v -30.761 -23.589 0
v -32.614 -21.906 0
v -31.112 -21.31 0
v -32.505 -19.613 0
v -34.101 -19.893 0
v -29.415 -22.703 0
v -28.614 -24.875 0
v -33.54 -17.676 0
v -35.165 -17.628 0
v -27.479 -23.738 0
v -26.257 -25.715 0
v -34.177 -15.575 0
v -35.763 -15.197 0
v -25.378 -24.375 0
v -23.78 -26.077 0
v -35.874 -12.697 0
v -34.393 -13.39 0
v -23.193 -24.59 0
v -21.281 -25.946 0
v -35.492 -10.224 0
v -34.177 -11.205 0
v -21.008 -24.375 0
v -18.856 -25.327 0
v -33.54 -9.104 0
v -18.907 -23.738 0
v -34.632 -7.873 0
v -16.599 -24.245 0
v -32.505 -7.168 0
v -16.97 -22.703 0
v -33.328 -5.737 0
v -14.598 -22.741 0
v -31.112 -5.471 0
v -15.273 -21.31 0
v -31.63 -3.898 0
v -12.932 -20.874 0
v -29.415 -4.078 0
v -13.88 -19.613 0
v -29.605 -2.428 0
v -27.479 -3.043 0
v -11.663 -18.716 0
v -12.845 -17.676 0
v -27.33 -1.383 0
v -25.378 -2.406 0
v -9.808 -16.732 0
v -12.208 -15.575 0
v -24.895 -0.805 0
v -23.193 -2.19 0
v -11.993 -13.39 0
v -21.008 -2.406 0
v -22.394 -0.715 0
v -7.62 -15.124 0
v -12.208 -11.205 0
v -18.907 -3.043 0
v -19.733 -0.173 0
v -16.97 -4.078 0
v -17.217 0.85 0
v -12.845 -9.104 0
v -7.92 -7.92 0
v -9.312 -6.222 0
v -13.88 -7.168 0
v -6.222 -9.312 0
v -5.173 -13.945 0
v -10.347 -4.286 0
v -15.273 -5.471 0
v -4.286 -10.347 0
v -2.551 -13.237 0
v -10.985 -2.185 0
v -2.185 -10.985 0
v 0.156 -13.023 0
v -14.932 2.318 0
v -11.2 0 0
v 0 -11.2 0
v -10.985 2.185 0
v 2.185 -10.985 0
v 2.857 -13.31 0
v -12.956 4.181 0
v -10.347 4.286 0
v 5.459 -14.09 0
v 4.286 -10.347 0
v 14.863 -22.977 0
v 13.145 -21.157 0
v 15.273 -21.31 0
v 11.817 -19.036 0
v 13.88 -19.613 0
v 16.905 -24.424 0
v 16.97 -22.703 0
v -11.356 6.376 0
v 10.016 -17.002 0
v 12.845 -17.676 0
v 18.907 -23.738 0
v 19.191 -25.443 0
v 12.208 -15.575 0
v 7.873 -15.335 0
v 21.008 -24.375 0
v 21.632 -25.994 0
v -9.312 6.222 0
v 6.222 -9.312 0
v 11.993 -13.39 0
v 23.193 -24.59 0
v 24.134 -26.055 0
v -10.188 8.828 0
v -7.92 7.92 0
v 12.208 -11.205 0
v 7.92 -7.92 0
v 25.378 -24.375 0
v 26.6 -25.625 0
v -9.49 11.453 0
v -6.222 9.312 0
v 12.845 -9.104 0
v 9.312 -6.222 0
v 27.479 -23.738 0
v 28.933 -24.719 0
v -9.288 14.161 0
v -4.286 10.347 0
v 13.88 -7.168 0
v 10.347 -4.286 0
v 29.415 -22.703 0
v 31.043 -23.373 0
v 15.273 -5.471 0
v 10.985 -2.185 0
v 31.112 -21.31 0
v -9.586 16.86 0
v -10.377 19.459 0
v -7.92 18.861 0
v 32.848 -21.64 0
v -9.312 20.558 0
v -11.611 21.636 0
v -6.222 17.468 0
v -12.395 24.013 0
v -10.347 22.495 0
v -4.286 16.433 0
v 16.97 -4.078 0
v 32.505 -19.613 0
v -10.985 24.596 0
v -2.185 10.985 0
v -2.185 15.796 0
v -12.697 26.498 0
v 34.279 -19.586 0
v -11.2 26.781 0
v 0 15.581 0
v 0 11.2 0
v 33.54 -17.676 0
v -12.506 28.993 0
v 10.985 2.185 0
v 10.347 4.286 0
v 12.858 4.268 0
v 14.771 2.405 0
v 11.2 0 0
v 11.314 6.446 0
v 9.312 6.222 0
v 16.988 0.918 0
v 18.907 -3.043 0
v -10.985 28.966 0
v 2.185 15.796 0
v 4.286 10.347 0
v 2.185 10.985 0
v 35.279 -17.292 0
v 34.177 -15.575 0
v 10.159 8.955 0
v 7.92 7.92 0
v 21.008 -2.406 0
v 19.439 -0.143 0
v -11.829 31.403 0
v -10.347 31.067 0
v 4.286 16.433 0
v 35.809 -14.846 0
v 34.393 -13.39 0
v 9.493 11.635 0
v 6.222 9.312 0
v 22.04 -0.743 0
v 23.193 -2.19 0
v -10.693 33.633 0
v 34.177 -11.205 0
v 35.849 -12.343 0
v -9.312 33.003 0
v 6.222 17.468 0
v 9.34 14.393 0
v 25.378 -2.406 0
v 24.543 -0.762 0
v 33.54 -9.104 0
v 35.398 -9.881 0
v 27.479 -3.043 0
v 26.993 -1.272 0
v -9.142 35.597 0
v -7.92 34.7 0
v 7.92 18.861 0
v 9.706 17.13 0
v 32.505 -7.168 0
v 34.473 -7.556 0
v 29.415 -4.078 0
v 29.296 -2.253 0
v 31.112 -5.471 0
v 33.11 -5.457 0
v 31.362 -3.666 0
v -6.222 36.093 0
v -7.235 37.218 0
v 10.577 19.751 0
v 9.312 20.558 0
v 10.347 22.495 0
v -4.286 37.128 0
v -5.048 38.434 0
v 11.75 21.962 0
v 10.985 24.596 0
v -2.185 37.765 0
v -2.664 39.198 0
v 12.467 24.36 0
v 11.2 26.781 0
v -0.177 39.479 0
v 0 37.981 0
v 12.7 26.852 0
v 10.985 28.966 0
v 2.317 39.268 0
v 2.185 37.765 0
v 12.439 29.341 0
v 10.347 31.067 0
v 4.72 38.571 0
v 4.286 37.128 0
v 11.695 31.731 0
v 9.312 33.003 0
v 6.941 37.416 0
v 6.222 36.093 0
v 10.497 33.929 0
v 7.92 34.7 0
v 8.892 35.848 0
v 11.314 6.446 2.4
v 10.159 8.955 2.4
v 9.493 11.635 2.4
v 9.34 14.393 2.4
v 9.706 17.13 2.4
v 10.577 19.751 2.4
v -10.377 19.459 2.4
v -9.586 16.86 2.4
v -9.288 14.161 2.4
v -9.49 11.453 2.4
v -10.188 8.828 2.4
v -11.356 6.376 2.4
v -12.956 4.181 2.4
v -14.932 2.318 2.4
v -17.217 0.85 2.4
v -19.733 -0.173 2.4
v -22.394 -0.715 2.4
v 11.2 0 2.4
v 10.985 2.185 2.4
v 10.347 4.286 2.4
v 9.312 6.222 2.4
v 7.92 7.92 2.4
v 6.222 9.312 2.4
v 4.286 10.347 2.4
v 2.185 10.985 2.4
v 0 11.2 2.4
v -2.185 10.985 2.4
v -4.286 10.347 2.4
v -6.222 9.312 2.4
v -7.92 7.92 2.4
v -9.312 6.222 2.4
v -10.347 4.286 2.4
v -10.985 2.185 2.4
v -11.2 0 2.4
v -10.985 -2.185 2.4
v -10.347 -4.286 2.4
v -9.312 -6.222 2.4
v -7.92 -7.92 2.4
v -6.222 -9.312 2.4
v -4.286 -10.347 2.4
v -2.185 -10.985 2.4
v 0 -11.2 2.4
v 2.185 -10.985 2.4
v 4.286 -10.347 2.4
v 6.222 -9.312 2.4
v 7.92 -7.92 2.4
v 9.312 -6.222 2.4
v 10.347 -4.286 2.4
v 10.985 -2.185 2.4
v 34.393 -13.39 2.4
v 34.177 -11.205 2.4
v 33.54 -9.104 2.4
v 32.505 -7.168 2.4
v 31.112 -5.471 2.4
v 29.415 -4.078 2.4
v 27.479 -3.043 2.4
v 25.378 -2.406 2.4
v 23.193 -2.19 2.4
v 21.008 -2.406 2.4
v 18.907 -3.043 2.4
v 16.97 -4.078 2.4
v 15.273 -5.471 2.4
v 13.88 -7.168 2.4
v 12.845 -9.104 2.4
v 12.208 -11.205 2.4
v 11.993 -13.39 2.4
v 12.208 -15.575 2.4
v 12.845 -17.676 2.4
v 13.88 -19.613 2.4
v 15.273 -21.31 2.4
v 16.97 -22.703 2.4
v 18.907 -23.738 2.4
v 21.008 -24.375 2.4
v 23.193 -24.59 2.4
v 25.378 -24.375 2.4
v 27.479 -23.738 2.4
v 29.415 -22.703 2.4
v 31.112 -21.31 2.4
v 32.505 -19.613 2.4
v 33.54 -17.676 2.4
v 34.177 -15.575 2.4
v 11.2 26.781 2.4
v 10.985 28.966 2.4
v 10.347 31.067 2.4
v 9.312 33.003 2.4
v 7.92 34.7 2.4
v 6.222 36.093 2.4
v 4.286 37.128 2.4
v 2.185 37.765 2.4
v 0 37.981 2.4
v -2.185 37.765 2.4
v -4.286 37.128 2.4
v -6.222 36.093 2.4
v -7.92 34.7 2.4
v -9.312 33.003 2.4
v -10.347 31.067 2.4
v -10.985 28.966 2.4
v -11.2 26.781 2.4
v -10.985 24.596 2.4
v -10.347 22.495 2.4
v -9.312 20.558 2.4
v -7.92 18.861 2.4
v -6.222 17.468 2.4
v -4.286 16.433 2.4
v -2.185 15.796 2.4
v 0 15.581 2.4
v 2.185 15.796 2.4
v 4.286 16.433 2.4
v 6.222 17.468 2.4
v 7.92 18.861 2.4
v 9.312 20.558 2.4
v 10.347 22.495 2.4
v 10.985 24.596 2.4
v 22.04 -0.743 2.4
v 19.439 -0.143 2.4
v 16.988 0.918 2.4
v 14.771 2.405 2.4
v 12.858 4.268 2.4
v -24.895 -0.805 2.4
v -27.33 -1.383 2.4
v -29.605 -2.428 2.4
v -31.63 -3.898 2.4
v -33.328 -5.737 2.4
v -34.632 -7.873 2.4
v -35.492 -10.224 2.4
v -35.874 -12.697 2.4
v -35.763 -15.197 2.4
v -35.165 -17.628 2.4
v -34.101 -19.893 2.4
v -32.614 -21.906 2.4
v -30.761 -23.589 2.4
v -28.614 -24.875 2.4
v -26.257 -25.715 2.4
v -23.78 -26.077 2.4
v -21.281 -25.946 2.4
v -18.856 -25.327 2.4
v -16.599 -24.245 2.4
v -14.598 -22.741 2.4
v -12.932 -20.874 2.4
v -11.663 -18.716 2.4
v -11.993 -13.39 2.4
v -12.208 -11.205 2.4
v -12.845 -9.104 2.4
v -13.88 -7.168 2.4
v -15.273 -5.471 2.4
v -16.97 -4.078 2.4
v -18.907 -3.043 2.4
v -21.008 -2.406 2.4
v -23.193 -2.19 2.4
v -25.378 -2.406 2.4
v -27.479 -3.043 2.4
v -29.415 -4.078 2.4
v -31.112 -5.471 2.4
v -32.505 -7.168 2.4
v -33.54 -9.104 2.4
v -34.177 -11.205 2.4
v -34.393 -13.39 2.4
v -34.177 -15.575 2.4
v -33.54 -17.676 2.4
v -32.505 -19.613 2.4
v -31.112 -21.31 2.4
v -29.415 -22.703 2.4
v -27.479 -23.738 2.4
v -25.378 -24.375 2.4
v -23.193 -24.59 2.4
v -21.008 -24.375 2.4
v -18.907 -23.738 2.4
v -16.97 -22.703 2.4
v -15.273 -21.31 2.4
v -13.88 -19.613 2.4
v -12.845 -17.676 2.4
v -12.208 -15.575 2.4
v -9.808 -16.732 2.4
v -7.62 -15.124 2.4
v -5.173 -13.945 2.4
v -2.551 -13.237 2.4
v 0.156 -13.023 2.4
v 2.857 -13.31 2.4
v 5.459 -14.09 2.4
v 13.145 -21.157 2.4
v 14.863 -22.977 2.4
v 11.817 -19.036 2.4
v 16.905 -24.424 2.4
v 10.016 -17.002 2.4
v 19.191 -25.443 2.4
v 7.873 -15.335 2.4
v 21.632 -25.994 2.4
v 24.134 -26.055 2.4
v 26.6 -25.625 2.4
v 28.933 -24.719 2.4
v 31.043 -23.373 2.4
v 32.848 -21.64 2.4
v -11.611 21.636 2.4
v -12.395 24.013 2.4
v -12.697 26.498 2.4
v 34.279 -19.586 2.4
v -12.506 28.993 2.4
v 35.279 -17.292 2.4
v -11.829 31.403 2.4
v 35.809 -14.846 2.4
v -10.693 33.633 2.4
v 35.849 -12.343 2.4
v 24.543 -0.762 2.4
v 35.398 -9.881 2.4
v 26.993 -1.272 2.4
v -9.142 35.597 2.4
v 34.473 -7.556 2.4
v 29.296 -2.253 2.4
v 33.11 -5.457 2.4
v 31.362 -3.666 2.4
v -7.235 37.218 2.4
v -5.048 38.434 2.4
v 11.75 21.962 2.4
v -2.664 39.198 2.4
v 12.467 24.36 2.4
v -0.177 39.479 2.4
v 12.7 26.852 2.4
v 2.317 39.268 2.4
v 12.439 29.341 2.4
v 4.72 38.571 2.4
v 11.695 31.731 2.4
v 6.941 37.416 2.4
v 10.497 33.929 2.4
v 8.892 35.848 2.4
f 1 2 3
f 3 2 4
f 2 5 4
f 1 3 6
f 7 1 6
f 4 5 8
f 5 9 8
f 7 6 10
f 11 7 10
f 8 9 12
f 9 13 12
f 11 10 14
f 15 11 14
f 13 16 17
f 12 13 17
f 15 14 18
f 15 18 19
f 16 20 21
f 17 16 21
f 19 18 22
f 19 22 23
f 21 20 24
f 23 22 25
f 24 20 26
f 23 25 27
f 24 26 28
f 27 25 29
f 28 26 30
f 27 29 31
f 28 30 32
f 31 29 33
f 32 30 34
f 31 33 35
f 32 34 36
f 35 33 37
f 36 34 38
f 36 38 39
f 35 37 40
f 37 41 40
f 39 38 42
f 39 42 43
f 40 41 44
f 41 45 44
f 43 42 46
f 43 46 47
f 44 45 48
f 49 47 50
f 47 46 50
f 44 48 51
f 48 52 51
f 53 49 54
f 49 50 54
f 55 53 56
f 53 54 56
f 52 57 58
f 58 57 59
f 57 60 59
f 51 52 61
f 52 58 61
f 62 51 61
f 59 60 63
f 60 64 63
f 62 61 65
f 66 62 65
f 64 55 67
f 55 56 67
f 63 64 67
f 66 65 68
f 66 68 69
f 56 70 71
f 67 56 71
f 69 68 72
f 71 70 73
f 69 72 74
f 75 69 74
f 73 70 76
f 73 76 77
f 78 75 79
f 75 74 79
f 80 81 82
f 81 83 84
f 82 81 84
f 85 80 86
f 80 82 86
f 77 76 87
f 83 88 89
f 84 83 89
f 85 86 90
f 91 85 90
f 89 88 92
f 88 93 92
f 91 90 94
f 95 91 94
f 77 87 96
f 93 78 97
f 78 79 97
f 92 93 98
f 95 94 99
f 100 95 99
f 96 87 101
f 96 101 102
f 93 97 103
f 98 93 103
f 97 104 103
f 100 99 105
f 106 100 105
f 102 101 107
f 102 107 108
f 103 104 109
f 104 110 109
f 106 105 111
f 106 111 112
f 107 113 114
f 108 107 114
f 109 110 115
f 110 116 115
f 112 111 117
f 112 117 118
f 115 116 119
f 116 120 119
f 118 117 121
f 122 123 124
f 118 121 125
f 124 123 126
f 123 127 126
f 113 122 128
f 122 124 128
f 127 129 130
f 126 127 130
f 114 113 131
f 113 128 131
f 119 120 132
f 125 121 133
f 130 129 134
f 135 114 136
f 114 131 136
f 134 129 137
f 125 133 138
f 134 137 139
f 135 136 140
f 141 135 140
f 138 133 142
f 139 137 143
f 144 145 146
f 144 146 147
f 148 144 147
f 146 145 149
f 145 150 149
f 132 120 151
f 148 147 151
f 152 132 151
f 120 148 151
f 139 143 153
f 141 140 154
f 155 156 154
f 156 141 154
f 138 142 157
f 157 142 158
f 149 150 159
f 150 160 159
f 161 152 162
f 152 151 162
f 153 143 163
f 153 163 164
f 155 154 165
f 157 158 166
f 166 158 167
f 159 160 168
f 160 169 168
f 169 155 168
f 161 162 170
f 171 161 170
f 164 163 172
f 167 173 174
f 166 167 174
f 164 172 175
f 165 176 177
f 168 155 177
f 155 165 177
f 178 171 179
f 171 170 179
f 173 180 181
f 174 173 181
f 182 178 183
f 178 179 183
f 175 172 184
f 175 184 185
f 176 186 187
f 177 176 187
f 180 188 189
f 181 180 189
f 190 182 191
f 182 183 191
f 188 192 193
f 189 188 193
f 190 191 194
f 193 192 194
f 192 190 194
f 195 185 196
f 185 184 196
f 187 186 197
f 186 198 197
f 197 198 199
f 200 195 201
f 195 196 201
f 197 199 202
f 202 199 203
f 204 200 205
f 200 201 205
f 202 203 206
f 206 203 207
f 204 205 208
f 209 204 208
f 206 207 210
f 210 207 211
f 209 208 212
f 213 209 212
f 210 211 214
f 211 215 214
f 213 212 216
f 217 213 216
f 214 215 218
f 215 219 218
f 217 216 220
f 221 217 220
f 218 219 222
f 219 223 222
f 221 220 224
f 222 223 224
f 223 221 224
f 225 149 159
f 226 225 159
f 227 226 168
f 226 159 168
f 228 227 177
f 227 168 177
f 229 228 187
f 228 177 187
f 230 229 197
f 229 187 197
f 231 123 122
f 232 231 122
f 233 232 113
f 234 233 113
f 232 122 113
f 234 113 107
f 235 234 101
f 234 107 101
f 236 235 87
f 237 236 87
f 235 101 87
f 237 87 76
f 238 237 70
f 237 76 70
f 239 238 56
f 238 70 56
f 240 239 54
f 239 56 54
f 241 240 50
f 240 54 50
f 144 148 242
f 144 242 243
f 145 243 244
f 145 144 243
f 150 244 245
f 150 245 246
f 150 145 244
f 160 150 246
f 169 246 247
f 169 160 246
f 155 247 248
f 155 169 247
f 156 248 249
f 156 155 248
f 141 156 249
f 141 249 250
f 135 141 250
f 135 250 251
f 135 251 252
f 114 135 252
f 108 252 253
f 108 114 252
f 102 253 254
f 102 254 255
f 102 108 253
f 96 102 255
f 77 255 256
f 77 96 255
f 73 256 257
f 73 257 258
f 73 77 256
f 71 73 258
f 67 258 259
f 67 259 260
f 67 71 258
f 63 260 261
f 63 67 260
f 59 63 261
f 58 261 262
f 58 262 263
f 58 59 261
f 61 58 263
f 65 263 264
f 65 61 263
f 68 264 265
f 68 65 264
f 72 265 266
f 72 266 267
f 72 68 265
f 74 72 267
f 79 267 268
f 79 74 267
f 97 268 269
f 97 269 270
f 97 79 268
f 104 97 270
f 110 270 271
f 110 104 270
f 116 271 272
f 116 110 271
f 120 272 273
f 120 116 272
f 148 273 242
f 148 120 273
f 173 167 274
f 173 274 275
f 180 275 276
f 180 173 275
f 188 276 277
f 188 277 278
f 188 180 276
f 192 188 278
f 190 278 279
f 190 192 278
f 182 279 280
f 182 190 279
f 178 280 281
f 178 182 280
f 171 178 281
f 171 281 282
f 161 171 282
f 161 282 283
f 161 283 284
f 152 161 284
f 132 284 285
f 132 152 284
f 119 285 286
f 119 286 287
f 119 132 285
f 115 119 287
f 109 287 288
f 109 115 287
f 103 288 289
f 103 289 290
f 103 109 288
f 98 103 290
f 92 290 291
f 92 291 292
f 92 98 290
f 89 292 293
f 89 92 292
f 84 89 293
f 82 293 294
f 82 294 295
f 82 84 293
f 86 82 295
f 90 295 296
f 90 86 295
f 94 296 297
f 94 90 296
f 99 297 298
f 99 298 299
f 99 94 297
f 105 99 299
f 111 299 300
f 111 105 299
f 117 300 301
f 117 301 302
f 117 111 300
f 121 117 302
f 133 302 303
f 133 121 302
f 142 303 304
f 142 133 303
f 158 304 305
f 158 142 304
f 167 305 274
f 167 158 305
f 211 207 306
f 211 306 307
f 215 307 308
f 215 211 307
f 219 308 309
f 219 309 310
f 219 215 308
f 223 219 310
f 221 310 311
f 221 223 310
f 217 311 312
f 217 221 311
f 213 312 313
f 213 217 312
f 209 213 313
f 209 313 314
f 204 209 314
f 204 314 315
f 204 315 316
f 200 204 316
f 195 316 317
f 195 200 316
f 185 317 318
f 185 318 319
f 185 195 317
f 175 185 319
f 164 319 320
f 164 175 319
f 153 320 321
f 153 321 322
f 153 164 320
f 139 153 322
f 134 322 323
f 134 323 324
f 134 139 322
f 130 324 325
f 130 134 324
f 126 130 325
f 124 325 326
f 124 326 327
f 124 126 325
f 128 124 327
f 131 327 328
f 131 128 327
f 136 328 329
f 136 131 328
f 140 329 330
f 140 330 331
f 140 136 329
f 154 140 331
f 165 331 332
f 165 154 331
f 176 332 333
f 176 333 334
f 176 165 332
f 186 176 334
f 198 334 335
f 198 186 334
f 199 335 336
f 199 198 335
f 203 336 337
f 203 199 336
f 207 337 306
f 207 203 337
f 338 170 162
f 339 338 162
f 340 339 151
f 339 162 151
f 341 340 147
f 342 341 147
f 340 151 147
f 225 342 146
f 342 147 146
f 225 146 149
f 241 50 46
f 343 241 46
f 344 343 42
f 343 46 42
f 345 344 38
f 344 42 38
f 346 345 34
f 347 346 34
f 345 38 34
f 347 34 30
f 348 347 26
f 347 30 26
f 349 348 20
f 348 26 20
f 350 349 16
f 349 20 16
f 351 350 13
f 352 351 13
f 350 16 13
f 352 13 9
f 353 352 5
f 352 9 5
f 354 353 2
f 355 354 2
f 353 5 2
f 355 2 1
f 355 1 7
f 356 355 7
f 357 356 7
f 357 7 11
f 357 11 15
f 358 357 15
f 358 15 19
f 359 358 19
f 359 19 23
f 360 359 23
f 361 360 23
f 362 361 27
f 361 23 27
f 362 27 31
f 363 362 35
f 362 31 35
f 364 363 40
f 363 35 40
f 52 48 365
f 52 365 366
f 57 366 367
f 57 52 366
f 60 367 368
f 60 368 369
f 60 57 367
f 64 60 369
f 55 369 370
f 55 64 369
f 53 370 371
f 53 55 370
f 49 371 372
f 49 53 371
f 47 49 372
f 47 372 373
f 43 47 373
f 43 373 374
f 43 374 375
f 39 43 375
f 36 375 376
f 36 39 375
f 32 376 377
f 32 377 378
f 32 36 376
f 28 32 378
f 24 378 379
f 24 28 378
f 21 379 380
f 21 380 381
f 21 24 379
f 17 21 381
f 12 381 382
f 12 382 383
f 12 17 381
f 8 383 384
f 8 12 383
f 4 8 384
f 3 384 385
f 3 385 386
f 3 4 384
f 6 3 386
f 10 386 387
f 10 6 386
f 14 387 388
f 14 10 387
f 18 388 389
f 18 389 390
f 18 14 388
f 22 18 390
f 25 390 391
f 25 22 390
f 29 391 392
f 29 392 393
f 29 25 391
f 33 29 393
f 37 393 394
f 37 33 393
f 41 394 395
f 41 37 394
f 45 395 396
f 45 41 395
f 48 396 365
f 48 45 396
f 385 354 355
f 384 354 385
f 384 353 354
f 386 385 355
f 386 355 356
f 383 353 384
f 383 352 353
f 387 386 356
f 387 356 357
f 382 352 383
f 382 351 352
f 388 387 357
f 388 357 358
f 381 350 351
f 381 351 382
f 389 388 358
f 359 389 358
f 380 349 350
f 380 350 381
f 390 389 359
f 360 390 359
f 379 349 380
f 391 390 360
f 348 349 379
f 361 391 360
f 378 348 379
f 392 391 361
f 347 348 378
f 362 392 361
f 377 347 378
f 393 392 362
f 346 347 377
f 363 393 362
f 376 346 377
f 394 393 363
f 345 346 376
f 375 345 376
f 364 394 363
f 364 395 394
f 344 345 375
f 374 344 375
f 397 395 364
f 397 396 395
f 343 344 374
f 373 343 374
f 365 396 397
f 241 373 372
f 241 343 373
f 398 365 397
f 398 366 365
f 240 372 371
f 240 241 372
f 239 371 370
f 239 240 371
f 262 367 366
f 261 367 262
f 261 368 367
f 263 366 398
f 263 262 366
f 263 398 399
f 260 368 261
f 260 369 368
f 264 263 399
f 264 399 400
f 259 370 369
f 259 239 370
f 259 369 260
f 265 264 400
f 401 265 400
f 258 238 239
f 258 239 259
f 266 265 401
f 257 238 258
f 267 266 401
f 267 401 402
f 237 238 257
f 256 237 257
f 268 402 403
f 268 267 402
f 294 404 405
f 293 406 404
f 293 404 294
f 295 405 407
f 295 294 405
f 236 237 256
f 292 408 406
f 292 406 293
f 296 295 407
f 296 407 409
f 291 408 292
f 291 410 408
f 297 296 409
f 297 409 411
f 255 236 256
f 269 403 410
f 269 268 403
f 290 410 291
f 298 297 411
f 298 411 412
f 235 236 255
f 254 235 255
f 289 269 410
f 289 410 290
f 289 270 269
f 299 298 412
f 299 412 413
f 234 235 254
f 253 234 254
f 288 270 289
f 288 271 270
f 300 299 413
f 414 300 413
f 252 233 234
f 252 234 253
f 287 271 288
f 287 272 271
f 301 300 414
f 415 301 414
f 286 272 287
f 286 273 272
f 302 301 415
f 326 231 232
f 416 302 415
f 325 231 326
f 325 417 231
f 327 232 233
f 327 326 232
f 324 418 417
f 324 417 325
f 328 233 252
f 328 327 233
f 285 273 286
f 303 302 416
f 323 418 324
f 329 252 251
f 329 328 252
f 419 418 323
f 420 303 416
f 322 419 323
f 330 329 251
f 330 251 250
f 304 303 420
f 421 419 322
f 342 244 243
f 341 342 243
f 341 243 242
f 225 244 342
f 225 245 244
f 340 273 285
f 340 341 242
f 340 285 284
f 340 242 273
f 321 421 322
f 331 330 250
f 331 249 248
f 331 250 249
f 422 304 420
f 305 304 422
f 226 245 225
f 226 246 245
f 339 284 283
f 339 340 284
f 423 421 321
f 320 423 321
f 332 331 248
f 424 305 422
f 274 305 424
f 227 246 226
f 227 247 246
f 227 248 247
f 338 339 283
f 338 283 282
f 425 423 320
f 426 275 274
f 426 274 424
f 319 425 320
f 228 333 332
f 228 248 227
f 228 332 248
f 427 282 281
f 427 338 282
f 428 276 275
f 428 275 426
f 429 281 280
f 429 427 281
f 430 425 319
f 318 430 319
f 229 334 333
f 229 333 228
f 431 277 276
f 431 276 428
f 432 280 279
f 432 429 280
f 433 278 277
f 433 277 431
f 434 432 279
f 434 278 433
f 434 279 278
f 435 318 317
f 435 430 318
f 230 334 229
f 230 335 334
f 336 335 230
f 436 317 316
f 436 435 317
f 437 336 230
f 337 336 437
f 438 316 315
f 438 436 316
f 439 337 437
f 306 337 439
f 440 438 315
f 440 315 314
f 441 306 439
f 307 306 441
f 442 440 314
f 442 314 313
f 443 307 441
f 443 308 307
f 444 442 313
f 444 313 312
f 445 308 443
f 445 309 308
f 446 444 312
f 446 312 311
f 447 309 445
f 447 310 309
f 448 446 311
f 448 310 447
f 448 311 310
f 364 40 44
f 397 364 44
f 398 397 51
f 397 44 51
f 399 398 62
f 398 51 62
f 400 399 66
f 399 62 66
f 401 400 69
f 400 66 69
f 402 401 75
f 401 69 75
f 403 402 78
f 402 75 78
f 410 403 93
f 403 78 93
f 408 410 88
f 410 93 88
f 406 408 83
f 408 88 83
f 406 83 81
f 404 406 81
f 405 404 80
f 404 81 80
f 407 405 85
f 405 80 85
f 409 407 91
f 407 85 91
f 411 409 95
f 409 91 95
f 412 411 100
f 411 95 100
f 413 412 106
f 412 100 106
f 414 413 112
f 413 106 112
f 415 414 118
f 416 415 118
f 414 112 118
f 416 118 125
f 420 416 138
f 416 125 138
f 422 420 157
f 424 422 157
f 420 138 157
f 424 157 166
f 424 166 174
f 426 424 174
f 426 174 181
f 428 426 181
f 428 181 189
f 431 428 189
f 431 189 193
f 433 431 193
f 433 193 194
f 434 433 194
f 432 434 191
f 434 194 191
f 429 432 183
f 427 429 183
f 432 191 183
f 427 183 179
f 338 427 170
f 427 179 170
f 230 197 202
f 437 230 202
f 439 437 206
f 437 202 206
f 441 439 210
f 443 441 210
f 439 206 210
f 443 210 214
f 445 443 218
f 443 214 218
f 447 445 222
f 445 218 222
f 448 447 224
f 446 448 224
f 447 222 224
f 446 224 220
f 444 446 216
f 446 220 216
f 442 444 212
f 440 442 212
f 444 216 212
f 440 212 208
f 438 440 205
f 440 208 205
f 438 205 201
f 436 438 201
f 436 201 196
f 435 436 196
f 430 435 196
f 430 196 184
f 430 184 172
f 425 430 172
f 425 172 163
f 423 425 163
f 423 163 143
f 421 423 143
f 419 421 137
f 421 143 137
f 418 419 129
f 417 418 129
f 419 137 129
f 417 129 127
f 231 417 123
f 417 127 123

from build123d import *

# Parameters (mm, degrees)
F0_R     = 11.2
F1_DEPTH = 2.4


with BuildPart() as f1:
    # F0 (on Top) → F1 (new body)
    with BuildSketch(Plane.XY):
        with BuildLine():
            ThreePointArc((11.314053, 6.446049), (9.351579, 13.010427), (10.577312, 19.751342))
            ThreePointArc((10.577312, 19.751342), (-0.177298, 39.479362), (-10.376945, 19.458782))
            ThreePointArc((-10.376945, 19.458782), (-11.356072, 6.375934), (-22.39382, -0.71545))
            ThreePointArc((-22.39382, -0.71545), (-34.101481, -19.893226), (-11.663327, -18.716089))
            ThreePointArc((-11.663327, -18.716089), (0.156315, -13.022614), (11.816508, -19.035892))
            ThreePointArc((11.816508, -19.035892), (34.27878, -19.586136), (22.040272, -0.742693))
            ThreePointArc((22.040272, -0.742693), (15.845674, 1.611026), (11.314053, 6.446049))
        make_face()
        with Locations((-23.19268, -13.3903)):
            Circle(F0_R, mode=Mode.SUBTRACT)
        with Locations((23.19268, -13.3903)):
            Circle(F0_R, mode=Mode.SUBTRACT)
        Circle(F0_R, mode=Mode.SUBTRACT)
        with Locations((0, 26.7806)):
            Circle(F0_R, mode=Mode.SUBTRACT)
    extrude(amount=F1_DEPTH)


solid = f1.part
